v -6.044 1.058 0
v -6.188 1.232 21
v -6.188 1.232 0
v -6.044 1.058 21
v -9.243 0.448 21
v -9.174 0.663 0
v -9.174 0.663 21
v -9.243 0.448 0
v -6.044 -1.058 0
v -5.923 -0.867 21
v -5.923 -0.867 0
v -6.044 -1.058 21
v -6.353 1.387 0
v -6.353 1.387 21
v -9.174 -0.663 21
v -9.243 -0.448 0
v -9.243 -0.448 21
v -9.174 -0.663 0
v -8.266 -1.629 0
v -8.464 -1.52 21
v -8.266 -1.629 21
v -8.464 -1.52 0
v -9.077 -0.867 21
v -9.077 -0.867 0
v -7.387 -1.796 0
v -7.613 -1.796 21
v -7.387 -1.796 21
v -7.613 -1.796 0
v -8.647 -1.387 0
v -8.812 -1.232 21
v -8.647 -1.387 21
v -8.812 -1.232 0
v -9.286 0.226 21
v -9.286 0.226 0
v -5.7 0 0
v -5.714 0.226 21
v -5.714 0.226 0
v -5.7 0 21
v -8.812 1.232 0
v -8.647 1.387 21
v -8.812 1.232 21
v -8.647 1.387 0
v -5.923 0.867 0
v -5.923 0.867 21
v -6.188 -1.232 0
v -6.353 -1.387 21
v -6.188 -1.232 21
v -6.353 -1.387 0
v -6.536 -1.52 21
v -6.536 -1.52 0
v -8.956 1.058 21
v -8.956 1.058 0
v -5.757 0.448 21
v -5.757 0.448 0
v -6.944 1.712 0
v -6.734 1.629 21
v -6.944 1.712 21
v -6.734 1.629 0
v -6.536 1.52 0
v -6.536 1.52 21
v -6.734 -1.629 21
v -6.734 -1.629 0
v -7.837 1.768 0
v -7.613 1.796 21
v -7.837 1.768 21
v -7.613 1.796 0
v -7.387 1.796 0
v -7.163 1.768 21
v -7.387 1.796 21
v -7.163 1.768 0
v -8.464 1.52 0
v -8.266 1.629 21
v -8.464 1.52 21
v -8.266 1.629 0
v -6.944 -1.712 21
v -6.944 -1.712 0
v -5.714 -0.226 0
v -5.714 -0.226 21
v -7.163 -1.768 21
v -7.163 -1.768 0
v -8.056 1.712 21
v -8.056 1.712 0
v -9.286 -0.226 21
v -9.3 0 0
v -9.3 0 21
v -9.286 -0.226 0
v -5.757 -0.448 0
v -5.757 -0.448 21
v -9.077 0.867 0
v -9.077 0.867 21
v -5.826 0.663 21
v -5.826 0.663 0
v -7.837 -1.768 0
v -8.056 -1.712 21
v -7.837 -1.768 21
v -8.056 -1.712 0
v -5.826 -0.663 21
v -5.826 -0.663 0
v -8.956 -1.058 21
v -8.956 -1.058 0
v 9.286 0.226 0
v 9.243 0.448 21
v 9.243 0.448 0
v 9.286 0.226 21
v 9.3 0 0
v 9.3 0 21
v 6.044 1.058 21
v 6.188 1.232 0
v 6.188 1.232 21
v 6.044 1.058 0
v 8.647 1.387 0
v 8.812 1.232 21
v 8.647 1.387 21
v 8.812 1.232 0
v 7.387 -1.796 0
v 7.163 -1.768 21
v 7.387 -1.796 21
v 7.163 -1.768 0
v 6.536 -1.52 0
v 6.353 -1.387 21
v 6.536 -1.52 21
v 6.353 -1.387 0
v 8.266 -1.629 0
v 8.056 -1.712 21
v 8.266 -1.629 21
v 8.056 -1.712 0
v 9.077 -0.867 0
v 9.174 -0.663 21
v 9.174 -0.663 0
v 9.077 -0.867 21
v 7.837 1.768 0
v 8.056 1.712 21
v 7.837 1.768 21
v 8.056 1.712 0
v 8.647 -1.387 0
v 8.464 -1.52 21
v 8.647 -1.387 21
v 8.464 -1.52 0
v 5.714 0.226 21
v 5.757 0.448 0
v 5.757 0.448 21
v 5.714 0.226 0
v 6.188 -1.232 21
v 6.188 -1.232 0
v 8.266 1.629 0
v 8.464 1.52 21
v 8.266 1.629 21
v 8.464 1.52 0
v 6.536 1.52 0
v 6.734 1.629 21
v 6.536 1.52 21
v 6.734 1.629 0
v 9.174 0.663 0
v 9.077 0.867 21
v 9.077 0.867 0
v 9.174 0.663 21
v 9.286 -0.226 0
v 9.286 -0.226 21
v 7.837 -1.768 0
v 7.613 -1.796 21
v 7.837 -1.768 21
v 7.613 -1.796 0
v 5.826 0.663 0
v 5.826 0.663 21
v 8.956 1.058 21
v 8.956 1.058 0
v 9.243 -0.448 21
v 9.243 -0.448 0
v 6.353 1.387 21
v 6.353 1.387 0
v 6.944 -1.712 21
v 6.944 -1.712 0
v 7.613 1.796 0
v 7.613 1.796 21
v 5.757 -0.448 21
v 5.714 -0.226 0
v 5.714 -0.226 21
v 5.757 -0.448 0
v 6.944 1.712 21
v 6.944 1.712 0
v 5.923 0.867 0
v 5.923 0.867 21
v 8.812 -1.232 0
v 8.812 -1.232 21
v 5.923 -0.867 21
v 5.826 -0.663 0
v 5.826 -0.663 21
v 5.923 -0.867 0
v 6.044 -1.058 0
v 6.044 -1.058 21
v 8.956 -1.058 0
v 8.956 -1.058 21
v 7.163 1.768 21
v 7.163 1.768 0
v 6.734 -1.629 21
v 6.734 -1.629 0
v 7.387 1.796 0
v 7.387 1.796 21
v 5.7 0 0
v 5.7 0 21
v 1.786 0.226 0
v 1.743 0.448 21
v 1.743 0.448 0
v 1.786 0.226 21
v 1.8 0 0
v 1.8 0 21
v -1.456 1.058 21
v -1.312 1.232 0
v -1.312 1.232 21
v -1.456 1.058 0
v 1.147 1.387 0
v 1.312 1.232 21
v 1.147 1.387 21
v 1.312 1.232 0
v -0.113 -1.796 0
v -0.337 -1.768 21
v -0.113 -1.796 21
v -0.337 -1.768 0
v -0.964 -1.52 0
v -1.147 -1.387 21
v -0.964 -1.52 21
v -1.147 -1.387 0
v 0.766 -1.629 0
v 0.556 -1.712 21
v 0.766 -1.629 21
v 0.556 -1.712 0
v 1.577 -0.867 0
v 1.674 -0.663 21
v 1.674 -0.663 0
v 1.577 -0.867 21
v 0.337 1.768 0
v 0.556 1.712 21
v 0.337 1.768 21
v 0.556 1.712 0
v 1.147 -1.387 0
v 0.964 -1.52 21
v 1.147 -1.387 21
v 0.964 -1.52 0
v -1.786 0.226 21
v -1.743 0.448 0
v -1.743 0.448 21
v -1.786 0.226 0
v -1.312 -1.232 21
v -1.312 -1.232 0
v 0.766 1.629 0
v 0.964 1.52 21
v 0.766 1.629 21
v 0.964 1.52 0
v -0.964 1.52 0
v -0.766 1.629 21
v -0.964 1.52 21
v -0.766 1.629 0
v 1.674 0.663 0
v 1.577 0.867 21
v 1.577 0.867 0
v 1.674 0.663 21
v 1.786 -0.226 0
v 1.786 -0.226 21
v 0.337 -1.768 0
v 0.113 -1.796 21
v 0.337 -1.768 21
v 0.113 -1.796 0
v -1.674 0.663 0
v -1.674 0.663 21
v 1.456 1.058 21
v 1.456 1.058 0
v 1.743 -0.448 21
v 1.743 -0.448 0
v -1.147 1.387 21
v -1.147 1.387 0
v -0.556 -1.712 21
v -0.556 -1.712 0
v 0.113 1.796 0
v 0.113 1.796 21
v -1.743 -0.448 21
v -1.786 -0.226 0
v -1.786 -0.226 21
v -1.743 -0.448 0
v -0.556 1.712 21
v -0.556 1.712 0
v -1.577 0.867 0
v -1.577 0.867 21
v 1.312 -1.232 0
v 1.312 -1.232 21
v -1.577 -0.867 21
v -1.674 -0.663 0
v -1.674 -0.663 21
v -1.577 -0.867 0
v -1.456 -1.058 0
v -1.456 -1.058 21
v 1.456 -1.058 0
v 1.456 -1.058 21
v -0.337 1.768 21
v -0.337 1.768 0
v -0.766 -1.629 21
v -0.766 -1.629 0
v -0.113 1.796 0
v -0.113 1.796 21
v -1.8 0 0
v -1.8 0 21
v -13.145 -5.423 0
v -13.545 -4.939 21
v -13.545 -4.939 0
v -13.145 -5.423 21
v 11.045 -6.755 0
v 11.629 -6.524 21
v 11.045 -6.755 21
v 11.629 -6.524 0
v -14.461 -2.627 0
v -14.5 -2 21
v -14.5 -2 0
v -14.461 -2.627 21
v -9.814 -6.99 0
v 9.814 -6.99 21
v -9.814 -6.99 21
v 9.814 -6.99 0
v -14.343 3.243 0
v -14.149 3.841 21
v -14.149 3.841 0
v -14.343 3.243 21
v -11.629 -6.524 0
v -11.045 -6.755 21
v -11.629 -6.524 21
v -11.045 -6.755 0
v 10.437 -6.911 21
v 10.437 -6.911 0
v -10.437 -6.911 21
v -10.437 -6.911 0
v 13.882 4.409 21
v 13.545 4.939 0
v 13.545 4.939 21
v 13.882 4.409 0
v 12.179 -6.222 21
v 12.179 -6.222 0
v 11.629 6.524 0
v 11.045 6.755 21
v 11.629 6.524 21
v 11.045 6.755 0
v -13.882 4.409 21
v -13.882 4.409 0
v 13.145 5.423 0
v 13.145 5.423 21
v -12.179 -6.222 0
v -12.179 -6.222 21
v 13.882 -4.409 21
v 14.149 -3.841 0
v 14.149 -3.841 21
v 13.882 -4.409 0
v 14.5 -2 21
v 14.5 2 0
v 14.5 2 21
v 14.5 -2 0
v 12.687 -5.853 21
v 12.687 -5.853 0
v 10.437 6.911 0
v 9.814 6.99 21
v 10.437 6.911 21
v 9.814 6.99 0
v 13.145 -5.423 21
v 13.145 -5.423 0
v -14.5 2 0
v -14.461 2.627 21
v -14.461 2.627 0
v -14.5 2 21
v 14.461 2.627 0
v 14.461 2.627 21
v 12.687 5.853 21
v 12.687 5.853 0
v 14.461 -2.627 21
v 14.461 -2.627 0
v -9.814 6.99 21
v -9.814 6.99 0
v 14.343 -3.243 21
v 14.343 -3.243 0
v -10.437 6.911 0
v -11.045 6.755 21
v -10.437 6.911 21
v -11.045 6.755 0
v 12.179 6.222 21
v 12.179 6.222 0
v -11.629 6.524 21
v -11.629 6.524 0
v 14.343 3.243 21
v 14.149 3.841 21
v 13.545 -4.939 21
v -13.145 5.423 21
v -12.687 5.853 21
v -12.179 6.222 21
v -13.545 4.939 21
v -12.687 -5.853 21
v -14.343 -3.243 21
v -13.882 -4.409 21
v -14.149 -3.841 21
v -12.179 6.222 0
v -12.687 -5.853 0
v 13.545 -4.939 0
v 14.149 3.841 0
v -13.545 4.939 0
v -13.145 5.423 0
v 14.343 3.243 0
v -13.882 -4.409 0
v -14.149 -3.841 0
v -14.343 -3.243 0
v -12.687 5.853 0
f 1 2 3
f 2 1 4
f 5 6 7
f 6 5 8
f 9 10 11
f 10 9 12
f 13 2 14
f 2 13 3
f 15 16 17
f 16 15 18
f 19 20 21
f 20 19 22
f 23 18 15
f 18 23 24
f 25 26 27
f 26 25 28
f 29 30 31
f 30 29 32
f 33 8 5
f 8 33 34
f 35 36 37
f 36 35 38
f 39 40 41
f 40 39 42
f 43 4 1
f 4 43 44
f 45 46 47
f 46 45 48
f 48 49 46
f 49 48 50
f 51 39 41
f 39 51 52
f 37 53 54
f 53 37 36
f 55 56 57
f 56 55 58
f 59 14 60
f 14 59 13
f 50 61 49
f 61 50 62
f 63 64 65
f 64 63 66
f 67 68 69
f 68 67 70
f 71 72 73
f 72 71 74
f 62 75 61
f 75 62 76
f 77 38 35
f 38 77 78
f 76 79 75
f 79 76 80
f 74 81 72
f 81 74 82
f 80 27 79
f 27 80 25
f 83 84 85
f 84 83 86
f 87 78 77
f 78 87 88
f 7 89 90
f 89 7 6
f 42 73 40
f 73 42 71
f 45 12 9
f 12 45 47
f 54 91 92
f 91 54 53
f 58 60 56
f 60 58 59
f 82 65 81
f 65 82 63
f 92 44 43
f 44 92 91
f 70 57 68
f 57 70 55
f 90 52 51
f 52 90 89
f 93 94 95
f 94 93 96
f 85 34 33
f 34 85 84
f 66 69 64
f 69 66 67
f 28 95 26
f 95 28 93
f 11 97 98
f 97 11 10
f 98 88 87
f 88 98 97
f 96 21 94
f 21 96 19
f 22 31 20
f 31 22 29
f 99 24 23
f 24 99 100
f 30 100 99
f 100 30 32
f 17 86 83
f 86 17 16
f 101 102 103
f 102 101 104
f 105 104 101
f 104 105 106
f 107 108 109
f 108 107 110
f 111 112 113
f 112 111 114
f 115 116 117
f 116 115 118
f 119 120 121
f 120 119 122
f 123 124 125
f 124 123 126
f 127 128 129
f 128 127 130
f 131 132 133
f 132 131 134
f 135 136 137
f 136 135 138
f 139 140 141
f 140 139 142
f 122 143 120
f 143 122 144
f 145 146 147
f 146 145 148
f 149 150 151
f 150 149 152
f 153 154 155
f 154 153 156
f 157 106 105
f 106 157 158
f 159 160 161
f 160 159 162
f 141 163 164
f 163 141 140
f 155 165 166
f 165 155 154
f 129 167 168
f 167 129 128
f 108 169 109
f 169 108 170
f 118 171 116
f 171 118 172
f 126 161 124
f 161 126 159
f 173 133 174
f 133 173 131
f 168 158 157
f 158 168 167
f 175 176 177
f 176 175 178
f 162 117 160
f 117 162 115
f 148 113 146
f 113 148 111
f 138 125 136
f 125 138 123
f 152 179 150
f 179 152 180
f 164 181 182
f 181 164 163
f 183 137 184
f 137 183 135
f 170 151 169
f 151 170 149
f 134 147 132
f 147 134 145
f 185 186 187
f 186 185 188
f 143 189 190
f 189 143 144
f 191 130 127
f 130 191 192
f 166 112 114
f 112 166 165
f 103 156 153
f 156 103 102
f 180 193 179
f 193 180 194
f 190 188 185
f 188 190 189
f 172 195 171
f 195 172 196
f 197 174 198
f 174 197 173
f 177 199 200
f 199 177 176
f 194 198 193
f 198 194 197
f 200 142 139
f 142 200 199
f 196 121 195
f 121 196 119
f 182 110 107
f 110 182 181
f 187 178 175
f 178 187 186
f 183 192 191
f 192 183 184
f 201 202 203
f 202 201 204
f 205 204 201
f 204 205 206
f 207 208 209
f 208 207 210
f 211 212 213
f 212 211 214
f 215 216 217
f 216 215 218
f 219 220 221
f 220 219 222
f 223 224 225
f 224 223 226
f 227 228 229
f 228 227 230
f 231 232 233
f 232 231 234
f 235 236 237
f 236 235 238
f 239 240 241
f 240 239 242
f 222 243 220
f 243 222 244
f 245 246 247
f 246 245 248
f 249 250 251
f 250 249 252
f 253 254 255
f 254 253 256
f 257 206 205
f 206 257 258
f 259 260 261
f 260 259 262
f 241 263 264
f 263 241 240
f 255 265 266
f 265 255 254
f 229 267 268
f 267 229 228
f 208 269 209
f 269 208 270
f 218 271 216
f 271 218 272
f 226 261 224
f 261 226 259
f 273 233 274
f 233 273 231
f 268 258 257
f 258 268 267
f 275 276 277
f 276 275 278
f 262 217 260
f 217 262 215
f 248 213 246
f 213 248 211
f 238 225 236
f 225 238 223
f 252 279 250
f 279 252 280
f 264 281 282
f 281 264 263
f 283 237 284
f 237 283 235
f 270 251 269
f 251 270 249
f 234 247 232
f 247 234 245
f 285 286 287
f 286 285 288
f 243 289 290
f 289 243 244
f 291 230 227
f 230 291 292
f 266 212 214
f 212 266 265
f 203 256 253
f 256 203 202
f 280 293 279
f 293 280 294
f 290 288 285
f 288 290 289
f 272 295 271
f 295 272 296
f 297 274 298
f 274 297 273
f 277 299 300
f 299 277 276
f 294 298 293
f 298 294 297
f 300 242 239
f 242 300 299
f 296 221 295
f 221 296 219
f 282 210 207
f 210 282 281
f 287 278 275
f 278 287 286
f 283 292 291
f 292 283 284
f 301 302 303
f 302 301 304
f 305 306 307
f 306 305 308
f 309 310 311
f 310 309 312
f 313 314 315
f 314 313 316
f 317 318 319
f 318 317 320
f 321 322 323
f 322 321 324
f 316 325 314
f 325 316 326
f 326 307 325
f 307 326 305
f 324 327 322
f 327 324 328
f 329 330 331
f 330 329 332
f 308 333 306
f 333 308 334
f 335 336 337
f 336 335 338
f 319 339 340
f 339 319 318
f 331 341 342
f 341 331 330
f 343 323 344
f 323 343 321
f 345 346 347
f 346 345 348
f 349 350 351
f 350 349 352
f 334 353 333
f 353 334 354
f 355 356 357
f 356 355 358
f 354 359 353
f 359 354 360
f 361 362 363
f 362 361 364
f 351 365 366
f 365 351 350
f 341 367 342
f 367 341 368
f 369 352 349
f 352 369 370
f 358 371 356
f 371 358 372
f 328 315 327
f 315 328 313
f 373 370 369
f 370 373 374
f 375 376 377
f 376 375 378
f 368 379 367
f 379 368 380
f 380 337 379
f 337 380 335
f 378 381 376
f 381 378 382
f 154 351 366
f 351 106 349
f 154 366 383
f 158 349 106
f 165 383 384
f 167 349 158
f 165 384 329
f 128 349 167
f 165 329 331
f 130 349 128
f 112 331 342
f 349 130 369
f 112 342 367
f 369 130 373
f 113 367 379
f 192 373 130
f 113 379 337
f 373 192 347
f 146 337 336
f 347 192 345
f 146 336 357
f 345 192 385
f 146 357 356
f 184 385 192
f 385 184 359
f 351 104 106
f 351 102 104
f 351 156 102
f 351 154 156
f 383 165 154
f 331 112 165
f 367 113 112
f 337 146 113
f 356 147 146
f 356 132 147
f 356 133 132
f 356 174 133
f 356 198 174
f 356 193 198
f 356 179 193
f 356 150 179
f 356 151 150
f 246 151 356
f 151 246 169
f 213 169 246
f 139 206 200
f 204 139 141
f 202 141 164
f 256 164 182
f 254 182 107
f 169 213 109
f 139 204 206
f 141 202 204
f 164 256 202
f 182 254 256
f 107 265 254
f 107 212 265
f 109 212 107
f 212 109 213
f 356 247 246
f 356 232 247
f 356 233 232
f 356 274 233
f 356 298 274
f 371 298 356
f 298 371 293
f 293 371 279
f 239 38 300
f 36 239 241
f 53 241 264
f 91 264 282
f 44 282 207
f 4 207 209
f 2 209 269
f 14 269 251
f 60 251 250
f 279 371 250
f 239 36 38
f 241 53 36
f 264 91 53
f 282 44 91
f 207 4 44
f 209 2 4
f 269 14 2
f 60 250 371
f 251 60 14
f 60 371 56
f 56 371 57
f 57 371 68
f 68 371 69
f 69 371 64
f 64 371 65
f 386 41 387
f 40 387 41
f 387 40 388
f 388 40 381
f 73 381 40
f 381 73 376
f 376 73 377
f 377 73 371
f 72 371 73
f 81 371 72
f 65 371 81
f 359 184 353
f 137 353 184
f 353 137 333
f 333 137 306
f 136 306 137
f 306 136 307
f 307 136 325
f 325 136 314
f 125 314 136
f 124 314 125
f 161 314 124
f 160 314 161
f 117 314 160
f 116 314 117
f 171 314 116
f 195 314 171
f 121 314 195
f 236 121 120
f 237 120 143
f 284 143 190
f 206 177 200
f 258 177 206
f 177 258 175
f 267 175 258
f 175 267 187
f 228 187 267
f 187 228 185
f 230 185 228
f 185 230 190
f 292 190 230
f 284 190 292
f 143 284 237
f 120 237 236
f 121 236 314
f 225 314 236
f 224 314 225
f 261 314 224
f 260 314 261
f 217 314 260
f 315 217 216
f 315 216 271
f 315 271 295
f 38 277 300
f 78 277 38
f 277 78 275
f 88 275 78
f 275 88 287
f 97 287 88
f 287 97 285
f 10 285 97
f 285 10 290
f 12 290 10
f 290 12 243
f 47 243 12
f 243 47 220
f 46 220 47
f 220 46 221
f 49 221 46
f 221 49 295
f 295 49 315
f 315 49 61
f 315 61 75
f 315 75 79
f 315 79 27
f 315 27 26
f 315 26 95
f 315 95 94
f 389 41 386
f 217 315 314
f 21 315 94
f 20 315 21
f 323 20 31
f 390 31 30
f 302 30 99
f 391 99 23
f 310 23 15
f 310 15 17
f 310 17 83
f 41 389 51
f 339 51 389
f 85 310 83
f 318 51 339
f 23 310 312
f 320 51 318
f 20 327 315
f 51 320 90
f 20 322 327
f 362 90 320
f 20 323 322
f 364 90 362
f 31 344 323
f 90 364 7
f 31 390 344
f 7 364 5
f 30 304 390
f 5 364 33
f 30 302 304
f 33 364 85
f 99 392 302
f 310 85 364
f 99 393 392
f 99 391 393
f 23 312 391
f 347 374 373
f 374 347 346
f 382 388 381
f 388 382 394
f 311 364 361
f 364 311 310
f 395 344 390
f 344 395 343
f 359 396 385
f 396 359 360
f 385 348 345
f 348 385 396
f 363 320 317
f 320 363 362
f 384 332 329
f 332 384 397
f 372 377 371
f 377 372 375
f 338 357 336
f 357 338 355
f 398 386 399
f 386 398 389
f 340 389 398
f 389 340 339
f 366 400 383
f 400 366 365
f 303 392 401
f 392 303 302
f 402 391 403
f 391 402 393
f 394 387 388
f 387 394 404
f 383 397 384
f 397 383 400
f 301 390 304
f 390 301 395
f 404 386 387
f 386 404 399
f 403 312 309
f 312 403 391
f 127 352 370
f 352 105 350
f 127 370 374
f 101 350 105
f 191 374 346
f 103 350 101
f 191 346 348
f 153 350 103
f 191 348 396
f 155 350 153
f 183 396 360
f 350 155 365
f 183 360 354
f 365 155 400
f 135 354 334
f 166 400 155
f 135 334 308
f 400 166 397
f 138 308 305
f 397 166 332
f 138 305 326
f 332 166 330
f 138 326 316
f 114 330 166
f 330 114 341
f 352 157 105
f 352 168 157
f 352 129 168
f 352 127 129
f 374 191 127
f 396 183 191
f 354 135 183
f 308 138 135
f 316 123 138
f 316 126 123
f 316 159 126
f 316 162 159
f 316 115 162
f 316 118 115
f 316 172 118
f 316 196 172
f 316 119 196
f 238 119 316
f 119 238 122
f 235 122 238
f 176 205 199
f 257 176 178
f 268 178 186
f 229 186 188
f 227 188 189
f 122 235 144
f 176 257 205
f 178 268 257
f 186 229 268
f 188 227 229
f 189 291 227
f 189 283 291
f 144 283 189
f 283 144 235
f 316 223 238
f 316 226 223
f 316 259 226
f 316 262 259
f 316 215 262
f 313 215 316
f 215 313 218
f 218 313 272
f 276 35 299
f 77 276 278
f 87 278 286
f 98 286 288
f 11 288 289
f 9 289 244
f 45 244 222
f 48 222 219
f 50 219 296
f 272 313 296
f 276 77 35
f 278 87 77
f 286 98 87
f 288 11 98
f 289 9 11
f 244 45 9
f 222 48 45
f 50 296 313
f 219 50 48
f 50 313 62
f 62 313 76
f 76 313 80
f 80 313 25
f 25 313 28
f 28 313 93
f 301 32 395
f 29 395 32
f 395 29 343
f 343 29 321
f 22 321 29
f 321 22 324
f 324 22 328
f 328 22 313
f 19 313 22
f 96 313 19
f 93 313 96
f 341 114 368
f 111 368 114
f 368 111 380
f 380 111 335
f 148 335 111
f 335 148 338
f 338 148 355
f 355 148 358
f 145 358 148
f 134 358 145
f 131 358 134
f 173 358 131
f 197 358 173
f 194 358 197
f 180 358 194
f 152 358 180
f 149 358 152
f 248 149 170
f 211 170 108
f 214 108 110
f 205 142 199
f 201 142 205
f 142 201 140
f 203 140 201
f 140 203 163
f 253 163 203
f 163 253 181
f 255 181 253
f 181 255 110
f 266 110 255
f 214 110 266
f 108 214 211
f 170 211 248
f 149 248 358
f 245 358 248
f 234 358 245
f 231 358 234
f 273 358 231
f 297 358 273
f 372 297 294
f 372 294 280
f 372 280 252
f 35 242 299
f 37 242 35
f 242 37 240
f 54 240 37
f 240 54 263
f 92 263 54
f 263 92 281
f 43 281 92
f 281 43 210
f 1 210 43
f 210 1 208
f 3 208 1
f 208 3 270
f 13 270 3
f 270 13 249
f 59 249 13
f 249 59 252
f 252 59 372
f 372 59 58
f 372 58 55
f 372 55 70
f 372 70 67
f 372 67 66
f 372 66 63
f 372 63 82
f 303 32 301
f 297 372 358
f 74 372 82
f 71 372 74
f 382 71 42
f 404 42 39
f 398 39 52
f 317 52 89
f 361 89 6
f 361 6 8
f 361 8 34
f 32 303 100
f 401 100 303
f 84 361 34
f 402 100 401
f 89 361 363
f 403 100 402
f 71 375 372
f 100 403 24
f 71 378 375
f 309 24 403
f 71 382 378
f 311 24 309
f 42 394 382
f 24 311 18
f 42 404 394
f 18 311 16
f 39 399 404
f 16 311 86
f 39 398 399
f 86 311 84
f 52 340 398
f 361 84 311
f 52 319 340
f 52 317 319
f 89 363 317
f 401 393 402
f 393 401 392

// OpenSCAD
$fn = 50;


difference() {
	union() {
		hull() {
			translate(v = [-9.5000000000, 2.0000000000, 0]) {
				cylinder(h = 21, r = 5);
			}
			translate(v = [9.5000000000, 2.0000000000, 0]) {
				cylinder(h = 21, r = 5);
			}
			translate(v = [-9.5000000000, -2.0000000000, 0]) {
				cylinder(h = 21, r = 5);
			}
			translate(v = [9.5000000000, -2.0000000000, 0]) {
				cylinder(h = 21, r = 5);
			}
		}
	}
	union() {
		translate(v = [-7.5000000000, 0.0000000000, 0]) {
			translate(v = [0, 0, -100]) {
				cylinder(h = 200, r = 1.8000000000);
			}
		}
		translate(v = [7.5000000000, 0.0000000000, 0]) {
			translate(v = [0, 0, -100]) {
				cylinder(h = 200, r = 1.8000000000);
			}
		}
		translate(v = [-7.5000000000, 0.0000000000, 0]) {
			translate(v = [0, 0, -100]) {
				cylinder(h = 200, r = 1.8000000000);
			}
		}
		translate(v = [0, 0, -100]) {
			cylinder(h = 200, r = 1.8000000000);
		}
		translate(v = [7.5000000000, 0.0000000000, 0]) {
			translate(v = [0, 0, -100]) {
				cylinder(h = 200, r = 1.8000000000);
			}
		}
	}
}
